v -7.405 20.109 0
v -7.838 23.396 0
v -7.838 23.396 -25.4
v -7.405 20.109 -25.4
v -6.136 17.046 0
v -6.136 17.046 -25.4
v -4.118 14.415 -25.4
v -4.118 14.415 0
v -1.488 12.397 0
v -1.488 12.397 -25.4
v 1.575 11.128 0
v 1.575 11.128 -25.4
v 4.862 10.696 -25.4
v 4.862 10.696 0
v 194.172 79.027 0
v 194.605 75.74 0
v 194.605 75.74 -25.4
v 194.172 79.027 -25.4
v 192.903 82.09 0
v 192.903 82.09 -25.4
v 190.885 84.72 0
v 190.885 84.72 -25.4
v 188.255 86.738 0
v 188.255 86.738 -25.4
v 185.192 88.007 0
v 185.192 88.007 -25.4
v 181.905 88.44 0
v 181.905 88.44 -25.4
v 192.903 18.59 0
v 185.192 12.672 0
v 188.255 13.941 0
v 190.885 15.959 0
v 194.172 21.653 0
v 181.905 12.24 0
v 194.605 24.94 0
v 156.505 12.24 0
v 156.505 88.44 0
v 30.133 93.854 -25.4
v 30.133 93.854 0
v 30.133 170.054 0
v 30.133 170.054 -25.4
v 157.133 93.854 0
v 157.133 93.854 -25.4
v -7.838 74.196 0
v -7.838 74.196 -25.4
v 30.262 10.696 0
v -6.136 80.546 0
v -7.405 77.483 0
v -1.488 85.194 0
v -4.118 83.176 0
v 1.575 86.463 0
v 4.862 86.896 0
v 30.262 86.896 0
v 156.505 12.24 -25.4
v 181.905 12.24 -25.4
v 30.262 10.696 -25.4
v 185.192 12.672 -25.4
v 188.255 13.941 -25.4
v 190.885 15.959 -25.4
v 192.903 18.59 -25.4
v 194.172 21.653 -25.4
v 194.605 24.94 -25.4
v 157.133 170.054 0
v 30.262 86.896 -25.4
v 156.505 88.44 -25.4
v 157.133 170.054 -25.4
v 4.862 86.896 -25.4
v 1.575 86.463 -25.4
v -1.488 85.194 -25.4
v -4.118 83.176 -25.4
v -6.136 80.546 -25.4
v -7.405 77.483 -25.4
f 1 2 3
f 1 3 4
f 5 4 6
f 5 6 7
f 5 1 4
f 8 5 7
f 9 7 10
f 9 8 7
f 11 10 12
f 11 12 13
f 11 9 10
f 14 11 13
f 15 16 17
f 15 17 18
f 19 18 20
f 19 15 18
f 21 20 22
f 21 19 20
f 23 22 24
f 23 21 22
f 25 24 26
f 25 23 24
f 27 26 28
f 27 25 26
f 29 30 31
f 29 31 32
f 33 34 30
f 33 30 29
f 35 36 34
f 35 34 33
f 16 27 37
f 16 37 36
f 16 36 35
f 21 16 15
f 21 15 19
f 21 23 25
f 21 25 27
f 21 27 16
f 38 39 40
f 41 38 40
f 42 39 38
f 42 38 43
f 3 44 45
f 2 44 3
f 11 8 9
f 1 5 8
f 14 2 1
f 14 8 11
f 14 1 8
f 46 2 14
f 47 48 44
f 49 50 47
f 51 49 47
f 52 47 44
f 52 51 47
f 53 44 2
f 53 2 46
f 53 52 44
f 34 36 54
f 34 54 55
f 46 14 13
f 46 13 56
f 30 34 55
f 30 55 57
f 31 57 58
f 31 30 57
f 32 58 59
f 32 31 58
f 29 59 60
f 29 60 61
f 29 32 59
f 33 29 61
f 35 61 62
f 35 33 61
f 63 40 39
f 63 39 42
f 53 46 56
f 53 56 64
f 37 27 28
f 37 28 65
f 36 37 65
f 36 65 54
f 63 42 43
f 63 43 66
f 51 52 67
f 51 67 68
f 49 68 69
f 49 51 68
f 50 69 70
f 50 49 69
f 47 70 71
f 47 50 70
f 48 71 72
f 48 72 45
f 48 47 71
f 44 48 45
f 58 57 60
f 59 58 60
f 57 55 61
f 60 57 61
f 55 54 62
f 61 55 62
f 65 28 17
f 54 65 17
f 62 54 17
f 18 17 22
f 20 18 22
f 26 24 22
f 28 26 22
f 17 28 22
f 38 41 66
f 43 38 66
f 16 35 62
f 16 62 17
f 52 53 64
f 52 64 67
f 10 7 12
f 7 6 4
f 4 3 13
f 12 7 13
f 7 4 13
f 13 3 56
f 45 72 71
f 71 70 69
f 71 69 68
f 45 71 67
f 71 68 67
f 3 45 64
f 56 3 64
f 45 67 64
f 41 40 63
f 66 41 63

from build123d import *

# Parameters (mm, degrees)
F1_W     = 127
F1_H     = 76.2
F4_DEPTH = 25.4
F5_DEPTH = 25.4
F6_DEPTH = 25.4


with BuildPart() as f4:
    # F1 (on face) → F4 (new body)
    with BuildSketch(Plane.XY):
        with Locations((93.632553, 131.953824)):
            Rectangle(F1_W, F1_H)
    extrude(amount=-F4_DEPTH)


with BuildPart() as f5:
    # F3 (on face) → F5 (new body)
    with BuildSketch(Plane.XY):
        with BuildLine():
            Line((181.90471, 88.439508), (156.50471, 88.439508))
            Line((156.50471, 88.439508), (156.50471, 12.239508))
            Line((156.50471, 12.239508), (181.90471, 12.239508))
            ThreePointArc((181.90471, 12.239508), (190.884966, 15.959252), (194.60471, 24.939508))
            Line((194.60471, 24.939508), (194.60471, 75.739508))
            ThreePointArc((194.60471, 75.739508), (190.884966, 84.719764), (181.90471, 88.439508))
        make_face()
    extrude(amount=-F5_DEPTH)


with BuildPart() as f6:
    # F2 (on face) → F6 (new body)
    with BuildSketch(Plane.XY):
        with BuildLine():
            Line((30.262375, 86.895682), (4.862375, 86.895682))
            ThreePointArc((4.862375, 86.895682), (-4.117881, 83.175939), (-7.837625, 74.195682))
            Line((-7.837625, 74.195682), (-7.837625, 23.395682))
            ThreePointArc((-7.837625, 23.395682), (-4.117881, 14.415426), (4.862375, 10.695682))
            Line((4.862375, 10.695682), (30.262375, 10.695682))
            Line((30.262375, 10.695682), (30.262375, 86.895682))
        make_face()
    extrude(amount=-F6_DEPTH)


solid = Compound([f4.part, f5.part, f6.part])
